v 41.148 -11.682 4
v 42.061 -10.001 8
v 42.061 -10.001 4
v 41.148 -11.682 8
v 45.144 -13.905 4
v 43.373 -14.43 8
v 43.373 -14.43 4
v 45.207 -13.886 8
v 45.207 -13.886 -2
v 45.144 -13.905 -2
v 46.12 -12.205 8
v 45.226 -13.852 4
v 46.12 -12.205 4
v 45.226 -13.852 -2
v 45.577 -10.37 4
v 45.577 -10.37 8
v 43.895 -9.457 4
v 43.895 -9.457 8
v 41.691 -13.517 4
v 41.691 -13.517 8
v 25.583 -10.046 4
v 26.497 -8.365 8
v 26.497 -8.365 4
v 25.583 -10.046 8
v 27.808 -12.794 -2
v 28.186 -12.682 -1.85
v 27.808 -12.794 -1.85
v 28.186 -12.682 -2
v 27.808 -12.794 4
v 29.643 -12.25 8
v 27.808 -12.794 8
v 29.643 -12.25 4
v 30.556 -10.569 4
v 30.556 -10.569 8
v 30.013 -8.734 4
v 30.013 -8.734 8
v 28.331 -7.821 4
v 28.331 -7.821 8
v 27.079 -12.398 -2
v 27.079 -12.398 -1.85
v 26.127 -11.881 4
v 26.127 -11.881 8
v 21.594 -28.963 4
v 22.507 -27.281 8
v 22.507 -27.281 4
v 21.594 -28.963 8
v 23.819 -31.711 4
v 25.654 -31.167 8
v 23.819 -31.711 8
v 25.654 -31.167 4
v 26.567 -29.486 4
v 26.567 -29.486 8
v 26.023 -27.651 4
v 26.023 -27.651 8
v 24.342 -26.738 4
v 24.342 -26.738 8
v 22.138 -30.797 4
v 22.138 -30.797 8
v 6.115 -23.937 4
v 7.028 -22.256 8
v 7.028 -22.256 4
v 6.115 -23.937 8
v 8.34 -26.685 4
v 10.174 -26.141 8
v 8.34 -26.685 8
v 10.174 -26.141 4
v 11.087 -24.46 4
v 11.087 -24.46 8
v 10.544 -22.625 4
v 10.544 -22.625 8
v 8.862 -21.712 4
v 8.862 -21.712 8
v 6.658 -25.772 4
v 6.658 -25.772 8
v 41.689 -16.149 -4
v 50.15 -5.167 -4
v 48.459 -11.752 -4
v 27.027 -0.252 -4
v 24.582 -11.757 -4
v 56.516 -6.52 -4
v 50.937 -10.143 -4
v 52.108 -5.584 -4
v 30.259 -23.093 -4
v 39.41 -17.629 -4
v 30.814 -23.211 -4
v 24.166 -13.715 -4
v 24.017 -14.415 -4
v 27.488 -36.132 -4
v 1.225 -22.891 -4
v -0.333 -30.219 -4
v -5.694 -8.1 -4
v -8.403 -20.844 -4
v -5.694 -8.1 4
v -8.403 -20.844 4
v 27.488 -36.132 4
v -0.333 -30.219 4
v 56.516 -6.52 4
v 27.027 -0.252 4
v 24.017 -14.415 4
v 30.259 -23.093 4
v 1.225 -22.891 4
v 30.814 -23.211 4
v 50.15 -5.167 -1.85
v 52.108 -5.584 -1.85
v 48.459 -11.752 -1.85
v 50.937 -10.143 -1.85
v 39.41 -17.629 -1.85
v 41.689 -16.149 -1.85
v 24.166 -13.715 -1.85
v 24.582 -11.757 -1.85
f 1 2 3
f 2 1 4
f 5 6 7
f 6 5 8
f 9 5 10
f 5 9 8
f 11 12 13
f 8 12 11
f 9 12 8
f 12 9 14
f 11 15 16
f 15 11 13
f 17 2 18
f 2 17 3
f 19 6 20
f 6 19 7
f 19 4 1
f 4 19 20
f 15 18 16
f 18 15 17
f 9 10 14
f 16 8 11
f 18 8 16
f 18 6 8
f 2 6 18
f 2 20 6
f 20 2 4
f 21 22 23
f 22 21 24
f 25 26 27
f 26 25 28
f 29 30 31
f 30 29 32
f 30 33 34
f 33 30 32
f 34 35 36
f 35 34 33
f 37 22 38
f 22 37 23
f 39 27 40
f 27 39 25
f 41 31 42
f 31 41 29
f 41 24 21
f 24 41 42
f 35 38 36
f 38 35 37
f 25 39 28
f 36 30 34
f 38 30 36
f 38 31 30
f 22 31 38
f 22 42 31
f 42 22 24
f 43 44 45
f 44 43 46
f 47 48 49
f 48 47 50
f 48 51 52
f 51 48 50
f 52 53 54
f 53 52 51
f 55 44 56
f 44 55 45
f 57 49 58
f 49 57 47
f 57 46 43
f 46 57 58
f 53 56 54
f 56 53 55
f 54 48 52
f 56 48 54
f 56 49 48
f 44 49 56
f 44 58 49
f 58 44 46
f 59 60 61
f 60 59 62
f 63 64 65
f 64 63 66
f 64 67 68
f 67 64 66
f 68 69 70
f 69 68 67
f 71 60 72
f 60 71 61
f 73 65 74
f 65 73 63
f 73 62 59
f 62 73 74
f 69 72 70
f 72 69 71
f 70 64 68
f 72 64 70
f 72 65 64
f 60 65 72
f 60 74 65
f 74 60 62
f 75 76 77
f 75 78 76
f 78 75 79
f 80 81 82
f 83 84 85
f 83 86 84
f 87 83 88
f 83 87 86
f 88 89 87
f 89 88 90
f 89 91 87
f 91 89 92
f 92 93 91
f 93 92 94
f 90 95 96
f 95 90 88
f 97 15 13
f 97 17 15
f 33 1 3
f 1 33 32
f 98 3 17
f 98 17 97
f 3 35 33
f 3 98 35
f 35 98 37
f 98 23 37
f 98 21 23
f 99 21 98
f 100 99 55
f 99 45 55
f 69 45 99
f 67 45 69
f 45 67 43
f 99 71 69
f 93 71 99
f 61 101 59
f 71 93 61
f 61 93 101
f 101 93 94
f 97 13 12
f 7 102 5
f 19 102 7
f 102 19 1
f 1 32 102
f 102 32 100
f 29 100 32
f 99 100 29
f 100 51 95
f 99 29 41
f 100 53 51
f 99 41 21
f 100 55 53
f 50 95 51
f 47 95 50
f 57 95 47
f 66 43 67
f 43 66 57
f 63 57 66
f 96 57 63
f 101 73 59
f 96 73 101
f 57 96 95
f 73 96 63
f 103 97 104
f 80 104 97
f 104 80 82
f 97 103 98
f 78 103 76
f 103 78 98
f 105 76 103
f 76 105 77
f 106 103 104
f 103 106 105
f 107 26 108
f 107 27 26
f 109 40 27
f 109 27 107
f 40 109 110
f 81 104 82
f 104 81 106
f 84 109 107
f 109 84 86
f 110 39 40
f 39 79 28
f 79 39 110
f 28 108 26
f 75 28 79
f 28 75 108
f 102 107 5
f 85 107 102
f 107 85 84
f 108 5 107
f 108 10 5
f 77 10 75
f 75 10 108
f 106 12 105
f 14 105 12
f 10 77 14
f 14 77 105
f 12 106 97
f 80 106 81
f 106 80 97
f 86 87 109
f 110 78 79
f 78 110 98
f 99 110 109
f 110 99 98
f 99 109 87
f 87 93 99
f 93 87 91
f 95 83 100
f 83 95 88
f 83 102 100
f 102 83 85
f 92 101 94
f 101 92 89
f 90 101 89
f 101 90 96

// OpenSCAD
//
// Block to hold tubing and modulate liquid flow
// 

module rotary()
{
	module hole(r, h) {
		rotate([0,0,0])
			cylinder(r=r, h=h,center=true);
	}
	// MOUNTING POSTS
	module posts() {
	 translate([114.26,0,-3])
	   hole(hradius, thickplus);
//	 translate([112,22.28,-3])
//	   hole(hradius, thickplus);

   translate([98.61, 0, -3])
	   hole( hradius, thickplus);
   translate([96.62, 19.23, -3])
	   hole( hradius, thickplus);

   translate([80.7, 15.85, -3])
	   hole( hradius, thickplus);
   }

    translate([-70,0,0]) rotate([0,0,alpha/2]) posts();
	difference() {
	// BODY (to be subtracted from)
	 translate([long,width/2,0])
	  rotate([0,0,alpha])
	   cube([length,width,thick],center=true);

	// WIRE TROUGH
	 translate([long+25,2+width/3,thickplus/2-dia])
	   rotate([0,0,90+1.2*alpha])
            cube([2*length,dia, dia+0.3],center=true);

	 translate([long+4,2+width/3,thickplus/2-dia])
	   rotate([0,0,1.2*alpha])
            cube([2*length,dia, dia+0.3],center=true);

    // WIRE CUT-OUT
	 translate([long+width-9.5,width-12,0])
	  rotate([0,0,45+alpha])
	   cube([20,32,thickplus],center=true);

	// CORNER CUT-OUTS
// lower left
	 translate([long-6-width/2,0,0])
	  rotate([0,0,alpha])
	   cube([length-10,width/1.9,thickplus],center=true);
// upper right
	 translate([long+20,width-2,0])
	  rotate([0,0,alpha])
	   cube([length/2,2+width/3,thickplus],center=true);

// Upper left
	 translate([medium-20,width-9,0])
	  rotate([0,0,alpha])
	   cube([length/3,2+width/4,thickplus],center=true);
}

	alpha  = 12; // Angle between radials in degrees

	length = 62; // mm   Main Block
	width  = 35; // mm
	thick = 8;  // 8mm

	thickplus = thick + 2;  // plus margin

	long   = 24; // mm  // Distances from center
	medium = 10; // mm
//	long   = 154; // mm  // Distances from center
//	medium = 133; // mm
	short  = 120; // mm

	hradius = 2.5;    // mounting hole radius mm
	dia     = 2.0;  // wire trough mm
	offset  = 5.6;  // distance from edge to mounting hole
}

rotate([180,0,0]) rotary();
